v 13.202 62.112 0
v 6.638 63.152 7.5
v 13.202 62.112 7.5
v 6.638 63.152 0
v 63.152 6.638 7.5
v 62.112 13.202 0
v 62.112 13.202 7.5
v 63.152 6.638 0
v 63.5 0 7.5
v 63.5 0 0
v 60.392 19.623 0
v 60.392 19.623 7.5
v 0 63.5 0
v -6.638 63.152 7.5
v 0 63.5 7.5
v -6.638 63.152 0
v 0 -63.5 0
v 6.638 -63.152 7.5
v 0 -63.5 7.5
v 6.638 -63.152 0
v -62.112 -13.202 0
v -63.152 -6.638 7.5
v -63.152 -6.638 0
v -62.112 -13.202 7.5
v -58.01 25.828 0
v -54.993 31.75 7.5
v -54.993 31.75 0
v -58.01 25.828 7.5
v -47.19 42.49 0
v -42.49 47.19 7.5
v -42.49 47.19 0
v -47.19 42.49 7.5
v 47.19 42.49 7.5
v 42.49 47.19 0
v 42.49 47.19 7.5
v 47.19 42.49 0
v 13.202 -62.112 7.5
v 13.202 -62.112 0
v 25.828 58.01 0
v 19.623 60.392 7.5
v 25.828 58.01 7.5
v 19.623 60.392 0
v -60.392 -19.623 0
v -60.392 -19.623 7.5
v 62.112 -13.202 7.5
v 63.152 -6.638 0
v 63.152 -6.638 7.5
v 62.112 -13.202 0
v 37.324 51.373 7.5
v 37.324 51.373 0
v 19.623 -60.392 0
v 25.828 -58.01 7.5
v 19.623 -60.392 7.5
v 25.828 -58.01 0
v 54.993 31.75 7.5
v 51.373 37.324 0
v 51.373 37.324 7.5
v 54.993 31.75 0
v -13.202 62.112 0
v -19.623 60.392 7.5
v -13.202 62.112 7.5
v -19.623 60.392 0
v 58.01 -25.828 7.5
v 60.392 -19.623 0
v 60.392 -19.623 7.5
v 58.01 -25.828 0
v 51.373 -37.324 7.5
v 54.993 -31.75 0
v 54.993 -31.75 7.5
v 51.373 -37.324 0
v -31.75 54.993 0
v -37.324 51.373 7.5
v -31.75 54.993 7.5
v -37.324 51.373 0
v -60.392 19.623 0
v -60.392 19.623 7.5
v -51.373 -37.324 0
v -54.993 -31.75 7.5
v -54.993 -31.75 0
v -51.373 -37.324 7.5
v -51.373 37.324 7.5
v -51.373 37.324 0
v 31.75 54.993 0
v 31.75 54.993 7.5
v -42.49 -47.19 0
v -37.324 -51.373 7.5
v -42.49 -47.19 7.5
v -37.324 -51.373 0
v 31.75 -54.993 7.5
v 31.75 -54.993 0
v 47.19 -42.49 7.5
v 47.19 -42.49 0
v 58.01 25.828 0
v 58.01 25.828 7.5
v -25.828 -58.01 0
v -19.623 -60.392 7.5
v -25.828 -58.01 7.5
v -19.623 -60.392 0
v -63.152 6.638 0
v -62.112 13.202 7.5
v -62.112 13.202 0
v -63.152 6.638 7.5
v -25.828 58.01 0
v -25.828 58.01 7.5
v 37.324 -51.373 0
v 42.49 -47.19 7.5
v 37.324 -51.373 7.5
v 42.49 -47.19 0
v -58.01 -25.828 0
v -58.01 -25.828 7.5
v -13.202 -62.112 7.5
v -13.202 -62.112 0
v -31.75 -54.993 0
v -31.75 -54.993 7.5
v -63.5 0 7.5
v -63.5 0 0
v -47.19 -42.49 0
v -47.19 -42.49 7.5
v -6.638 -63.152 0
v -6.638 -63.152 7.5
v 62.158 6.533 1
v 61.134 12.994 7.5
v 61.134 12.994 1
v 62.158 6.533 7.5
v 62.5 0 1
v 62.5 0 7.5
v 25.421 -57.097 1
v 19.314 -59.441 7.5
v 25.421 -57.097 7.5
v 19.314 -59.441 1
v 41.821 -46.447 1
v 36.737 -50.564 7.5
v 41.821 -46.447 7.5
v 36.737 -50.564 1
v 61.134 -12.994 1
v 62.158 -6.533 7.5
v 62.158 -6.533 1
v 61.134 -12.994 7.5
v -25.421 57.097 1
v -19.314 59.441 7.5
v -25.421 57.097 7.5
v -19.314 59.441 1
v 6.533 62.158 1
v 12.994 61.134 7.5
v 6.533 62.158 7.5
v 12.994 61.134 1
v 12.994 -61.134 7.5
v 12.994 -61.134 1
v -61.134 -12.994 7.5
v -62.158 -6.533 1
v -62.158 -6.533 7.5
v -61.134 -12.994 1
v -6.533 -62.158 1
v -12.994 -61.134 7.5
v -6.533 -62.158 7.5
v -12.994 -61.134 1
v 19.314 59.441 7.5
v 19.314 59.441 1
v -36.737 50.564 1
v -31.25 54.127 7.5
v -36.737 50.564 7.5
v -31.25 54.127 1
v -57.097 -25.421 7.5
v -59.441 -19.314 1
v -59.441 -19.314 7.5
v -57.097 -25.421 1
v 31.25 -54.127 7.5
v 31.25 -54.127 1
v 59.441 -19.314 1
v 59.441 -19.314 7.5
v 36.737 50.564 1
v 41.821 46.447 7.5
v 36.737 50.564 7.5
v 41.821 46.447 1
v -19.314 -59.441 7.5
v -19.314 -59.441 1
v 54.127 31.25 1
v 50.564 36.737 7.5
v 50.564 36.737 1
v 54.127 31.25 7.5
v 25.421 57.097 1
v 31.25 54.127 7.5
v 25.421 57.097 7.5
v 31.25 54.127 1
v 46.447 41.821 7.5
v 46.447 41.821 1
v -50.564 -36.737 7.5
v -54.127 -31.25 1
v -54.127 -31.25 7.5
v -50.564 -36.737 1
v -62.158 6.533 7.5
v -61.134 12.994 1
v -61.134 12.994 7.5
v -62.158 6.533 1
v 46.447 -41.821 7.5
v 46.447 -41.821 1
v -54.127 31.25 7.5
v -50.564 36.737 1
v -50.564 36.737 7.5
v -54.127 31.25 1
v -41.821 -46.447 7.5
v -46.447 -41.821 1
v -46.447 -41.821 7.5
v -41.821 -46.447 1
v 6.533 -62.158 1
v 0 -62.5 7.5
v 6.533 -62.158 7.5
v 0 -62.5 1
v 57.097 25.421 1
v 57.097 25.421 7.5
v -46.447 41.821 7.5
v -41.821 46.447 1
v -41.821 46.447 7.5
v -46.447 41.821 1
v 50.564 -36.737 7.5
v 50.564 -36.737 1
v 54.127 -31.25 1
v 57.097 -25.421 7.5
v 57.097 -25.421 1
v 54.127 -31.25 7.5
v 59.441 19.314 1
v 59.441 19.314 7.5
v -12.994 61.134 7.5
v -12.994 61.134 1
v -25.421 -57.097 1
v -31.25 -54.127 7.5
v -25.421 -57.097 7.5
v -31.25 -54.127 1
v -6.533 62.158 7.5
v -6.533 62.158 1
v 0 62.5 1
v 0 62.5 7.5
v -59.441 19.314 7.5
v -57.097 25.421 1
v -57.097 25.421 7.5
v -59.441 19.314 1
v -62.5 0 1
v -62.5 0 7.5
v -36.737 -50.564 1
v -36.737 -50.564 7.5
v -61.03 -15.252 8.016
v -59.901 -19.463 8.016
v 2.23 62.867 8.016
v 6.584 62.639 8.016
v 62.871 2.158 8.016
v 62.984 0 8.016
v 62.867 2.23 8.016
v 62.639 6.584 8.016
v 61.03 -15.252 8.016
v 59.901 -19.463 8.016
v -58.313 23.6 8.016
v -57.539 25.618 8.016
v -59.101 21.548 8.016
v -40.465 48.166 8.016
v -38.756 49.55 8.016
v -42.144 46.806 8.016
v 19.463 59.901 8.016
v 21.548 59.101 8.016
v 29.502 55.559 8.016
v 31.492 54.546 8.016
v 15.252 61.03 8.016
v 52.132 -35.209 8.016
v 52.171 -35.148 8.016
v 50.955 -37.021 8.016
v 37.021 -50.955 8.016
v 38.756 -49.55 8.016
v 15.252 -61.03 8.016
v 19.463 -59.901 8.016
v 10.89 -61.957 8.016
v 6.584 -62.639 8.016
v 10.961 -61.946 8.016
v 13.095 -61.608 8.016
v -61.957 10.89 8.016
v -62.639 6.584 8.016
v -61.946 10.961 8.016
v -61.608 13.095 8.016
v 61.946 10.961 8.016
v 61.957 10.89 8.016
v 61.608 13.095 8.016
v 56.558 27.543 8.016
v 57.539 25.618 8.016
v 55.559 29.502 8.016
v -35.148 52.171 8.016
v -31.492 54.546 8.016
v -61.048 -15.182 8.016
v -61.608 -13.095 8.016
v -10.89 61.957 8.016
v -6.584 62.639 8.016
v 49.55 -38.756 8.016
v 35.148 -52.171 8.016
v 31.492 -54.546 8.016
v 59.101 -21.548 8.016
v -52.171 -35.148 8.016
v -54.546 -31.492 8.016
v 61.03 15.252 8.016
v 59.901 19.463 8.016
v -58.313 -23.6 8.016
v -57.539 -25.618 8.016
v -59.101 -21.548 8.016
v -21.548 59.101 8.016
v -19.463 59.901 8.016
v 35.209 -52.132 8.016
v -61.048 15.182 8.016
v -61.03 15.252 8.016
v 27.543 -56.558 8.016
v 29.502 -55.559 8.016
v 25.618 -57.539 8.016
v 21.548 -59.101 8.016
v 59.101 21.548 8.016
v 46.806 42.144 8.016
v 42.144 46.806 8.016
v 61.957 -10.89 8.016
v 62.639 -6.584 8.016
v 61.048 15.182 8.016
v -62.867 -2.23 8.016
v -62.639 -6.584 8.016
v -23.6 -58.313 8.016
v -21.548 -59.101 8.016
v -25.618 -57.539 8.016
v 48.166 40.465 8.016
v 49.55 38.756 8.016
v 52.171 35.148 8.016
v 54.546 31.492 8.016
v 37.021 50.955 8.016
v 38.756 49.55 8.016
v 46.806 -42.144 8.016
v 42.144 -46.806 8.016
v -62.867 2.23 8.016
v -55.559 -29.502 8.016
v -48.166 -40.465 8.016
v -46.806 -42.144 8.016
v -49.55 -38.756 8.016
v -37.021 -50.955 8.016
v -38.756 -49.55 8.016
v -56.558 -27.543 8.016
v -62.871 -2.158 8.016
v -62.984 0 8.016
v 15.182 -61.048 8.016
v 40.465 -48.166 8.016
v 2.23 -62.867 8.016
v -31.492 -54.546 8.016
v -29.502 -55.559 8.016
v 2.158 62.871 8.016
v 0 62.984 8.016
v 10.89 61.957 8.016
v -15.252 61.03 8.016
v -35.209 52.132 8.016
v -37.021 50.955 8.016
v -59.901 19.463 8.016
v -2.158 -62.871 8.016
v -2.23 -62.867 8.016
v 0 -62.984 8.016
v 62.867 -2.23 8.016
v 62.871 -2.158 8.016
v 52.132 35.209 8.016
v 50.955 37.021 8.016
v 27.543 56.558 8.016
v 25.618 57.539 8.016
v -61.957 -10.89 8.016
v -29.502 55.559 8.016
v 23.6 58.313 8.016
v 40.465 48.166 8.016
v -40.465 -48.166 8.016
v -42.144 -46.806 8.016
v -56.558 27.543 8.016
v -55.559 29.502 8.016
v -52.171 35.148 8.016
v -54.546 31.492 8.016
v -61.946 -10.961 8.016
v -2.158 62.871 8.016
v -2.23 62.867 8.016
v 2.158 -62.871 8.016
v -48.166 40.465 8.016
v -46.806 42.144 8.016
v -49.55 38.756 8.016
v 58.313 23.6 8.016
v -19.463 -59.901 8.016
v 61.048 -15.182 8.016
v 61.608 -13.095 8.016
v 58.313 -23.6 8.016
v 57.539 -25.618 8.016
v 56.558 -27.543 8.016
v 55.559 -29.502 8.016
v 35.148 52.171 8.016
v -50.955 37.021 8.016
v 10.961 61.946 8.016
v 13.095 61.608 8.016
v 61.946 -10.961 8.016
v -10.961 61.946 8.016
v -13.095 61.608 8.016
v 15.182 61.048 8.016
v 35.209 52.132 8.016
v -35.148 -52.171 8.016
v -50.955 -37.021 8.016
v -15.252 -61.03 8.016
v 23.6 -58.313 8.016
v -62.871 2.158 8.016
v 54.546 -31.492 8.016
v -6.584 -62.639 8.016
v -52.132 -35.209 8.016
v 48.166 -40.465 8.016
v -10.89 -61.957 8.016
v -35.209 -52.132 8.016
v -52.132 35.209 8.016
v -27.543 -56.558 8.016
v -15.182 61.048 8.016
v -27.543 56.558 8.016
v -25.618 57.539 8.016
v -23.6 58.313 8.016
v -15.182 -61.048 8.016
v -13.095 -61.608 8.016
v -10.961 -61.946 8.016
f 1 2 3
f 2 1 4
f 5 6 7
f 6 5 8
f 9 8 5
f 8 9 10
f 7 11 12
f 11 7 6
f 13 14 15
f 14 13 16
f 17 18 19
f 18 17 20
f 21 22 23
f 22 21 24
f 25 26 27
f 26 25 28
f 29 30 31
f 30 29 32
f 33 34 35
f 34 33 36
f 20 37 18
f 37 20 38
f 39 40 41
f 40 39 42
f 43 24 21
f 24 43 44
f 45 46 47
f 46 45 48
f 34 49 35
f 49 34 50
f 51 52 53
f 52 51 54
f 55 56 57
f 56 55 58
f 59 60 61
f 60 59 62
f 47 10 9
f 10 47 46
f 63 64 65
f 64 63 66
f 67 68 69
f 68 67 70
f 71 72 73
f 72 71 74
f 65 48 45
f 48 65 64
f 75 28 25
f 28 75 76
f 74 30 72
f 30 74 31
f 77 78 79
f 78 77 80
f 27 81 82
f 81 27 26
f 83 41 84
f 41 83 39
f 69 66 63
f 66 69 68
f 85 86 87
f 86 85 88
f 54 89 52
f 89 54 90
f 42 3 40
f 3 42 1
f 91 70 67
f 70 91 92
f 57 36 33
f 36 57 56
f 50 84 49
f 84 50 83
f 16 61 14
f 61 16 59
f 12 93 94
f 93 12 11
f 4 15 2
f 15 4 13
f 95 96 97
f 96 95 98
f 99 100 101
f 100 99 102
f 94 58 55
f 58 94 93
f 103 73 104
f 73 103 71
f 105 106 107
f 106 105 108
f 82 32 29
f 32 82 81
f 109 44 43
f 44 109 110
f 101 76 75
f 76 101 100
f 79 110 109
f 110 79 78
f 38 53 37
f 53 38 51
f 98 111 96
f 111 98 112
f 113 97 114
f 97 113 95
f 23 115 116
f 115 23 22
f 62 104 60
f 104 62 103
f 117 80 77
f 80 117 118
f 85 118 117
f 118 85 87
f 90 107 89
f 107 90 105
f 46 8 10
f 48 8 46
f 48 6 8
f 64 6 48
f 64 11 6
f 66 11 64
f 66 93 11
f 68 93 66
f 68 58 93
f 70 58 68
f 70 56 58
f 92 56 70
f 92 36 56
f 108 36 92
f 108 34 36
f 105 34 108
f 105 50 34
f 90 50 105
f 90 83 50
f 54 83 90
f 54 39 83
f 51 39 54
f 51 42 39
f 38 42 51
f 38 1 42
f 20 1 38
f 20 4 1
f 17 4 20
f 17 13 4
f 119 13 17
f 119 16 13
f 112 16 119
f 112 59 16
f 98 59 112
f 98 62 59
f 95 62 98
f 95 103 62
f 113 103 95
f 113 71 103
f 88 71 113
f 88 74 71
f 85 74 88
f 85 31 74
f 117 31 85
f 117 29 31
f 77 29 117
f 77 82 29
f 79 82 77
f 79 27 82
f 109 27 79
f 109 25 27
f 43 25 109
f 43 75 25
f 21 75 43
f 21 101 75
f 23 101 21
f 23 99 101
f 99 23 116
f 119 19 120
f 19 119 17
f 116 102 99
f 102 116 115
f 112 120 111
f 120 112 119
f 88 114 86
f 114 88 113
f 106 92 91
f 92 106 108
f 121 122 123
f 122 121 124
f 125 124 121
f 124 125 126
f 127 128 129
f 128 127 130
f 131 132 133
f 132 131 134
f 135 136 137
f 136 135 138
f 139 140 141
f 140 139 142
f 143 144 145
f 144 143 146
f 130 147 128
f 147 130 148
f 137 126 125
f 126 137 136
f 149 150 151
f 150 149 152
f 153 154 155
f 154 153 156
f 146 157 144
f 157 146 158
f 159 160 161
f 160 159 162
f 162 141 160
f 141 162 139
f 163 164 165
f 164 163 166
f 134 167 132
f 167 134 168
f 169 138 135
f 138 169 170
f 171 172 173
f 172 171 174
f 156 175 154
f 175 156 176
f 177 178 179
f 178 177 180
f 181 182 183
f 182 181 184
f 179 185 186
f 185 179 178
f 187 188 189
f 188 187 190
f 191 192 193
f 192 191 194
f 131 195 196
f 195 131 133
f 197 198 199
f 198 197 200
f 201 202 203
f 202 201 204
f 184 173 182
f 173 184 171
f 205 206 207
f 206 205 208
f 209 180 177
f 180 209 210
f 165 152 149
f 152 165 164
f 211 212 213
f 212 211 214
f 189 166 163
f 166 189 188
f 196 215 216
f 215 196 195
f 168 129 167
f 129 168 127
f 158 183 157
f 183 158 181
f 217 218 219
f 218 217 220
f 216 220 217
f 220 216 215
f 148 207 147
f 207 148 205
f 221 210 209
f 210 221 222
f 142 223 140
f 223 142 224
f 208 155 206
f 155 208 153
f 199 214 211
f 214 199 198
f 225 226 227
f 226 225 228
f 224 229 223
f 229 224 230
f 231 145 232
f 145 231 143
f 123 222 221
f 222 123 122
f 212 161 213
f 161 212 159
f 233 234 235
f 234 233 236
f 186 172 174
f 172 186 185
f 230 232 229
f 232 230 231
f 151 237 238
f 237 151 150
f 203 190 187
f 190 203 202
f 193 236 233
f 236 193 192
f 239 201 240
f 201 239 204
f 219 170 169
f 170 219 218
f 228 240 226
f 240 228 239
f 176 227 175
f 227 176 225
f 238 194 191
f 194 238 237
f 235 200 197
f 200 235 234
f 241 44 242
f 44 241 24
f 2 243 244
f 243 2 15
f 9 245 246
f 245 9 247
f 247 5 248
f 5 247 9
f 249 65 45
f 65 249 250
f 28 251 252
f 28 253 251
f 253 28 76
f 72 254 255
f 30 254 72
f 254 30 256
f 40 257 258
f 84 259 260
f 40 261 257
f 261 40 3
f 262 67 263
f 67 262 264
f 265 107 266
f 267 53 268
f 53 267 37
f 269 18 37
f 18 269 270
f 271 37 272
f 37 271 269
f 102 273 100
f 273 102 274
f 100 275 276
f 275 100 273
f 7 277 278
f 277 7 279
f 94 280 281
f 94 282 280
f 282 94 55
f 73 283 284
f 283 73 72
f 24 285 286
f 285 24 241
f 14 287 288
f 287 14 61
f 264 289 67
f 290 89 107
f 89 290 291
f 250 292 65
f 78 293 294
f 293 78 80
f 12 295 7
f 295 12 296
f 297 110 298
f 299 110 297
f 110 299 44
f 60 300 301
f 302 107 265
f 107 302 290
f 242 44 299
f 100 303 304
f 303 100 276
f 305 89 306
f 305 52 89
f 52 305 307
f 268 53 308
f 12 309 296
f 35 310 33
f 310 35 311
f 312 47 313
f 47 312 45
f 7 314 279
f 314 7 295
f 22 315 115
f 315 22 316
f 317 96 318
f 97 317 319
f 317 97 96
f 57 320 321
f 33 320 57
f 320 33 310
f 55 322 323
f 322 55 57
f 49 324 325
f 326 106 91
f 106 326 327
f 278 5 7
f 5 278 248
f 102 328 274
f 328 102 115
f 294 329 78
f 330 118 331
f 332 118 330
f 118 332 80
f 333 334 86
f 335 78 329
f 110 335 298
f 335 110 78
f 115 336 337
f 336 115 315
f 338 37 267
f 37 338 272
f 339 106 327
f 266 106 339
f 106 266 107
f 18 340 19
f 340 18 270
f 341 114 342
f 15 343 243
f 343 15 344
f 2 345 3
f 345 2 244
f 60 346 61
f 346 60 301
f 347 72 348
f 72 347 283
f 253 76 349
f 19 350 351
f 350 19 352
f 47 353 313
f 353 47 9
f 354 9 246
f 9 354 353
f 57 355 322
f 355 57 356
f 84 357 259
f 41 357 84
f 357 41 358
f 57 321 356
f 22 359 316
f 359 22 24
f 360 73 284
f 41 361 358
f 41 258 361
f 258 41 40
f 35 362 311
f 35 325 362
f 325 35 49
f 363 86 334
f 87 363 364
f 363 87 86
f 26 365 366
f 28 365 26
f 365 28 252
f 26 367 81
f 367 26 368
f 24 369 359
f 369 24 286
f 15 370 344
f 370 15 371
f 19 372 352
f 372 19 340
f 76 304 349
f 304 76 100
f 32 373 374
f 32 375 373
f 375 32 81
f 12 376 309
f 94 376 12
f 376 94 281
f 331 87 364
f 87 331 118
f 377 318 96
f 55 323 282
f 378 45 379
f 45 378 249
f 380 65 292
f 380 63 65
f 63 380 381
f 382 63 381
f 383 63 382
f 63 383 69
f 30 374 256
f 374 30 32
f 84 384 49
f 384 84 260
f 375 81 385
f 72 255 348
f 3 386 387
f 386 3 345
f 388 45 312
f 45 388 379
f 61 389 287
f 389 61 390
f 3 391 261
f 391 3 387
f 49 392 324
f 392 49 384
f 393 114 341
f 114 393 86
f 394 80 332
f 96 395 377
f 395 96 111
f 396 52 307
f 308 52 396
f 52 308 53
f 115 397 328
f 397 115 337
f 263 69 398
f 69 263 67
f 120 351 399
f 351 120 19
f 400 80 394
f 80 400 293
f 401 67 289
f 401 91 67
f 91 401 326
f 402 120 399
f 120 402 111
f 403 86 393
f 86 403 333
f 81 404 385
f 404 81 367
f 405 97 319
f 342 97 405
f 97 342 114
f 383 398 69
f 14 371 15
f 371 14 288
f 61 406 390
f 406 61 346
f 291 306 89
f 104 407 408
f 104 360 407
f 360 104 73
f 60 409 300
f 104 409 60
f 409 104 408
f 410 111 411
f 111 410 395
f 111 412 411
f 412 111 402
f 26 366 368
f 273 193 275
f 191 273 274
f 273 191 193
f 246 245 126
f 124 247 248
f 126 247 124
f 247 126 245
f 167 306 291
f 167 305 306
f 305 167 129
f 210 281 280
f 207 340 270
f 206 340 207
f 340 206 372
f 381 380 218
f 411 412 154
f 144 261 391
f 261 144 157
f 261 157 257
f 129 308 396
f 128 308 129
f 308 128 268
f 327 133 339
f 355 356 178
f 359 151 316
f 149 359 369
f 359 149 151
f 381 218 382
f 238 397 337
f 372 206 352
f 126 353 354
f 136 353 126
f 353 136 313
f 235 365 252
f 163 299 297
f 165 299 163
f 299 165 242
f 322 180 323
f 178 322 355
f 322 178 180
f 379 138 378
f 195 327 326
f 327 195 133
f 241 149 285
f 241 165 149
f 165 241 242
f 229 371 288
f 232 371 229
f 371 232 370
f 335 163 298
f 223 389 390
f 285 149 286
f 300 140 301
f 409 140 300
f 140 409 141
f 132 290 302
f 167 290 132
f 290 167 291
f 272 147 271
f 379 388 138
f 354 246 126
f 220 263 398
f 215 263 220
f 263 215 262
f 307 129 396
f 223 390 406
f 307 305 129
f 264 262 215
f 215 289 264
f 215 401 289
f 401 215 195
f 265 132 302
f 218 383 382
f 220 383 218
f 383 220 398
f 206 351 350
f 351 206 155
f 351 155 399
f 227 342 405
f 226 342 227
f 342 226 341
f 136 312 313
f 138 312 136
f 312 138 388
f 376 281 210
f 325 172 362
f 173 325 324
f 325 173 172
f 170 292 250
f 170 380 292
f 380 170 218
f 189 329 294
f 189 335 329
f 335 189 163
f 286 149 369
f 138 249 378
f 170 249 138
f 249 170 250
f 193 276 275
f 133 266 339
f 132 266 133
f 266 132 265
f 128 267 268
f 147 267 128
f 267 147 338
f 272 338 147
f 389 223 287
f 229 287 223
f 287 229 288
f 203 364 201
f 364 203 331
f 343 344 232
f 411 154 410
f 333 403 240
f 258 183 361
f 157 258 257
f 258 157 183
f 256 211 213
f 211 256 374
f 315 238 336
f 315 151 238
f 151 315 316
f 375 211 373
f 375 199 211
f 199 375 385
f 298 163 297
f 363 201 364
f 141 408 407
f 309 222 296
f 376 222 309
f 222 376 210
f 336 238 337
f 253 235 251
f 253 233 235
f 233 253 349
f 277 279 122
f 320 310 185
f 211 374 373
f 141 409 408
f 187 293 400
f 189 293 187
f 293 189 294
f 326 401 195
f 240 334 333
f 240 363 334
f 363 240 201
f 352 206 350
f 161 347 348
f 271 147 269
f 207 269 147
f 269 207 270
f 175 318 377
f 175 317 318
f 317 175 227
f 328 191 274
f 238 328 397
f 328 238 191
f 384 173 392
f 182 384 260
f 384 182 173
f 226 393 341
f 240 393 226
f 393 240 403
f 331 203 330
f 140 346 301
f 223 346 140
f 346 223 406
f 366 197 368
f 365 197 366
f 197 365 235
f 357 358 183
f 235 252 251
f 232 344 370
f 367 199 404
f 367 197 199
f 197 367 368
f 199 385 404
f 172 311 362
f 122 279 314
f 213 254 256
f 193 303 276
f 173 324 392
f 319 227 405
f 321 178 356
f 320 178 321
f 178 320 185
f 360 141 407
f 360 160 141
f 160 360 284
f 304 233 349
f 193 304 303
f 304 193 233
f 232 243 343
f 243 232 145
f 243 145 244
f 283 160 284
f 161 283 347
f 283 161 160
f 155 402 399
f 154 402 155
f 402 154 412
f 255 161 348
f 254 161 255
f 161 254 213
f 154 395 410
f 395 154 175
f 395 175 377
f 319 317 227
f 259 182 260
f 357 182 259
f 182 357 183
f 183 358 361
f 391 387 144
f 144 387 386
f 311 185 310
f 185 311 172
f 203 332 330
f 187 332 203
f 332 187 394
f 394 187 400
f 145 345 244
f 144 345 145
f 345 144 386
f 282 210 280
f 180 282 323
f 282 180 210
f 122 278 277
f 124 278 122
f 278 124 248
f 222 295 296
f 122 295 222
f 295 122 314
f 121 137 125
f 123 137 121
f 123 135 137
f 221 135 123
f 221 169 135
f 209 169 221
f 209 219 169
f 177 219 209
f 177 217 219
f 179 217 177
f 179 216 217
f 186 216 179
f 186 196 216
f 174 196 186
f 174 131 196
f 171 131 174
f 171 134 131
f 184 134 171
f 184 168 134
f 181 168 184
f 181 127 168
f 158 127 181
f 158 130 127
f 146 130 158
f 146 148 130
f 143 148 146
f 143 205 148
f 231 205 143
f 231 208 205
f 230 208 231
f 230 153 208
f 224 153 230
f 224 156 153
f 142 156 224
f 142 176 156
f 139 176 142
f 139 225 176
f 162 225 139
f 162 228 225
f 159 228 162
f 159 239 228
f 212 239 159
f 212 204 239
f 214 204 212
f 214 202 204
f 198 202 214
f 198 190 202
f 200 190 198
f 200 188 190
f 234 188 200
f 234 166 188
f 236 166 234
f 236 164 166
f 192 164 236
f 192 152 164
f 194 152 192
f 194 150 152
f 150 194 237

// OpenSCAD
// =============================================
// 3D: Circular Plate Cap Ø123.6 (shell 1 mm, height 5 mm)
// Version: 1.0
// Author: ChatGPT (OpenSCAD)
// =============================================

// ----------------------------
// Настройка точности
// ----------------------------
$fn = 0;        // фиксированную сегментацию отключаем
$fa = 6;        // 5–8° обычно достаточно
$fs = 0.35;     // ≈ диаметр сопла (0.3–0.5 для сопла 0.4)
pin_fs = 0.25;  // чуть тоньше для штырей и отверстий

// ----------------------------
// Тестовые фрагменты (стандартный блок)
// ----------------------------
test_fragment = false; // true — печатать только укороченные фрагменты (base)
frag_size     = 20;    // размер квадрата вырезки, мм
frag_index    = 0;     // 0=НЛ, 1=ВЛ, 2=НП, 3=ВП (относительно основания)
frag_gap_x    = 10;    // зазор между фрагментами по X, мм
frag_h_extra  = 20;    // запас по высоте клипа, мм

// ----------------------------
// Фаски/скругления по краям
// ----------------------------
tiny = 0.1;                  // небольшой зазор для булевых операций
edge_chamfer_z = 0.8;        // высота фаски по Z (мм) для верхнего края
edge_chamfer_x = 0;          // совместимость с шаблонами
edge_chamfer_y = 0;          // совместимость с шаблонами
screen_frame_gap = 0.2;      // совместимость

// Скругления
radius_r = 1.5;              // целевой радиус округлений (1–2 мм по ТЗ)

// ----------------------------
// Параметры модели (все размеры в мм)
// ----------------------------
cap_inner_d     = 124.6;   // внутренний диаметр колпака (посадка)
wall_th         = 1.0;     // толщина стенки (радиальная)
top_th          = 1.0;     // толщина крышки сверху
cap_height      = 10.0;     // общая наружная высота колпака
fit_extra_inner = 0.20;    // технологический запас внутрь (увеличение внутреннего Ø)

// Вычисляемые размеры
cap_inner_d_eff = cap_inner_d + 2*fit_extra_inner; // реальный внутренний Ø для печати
cap_outer_d     = cap_inner_d_eff + 2*wall_th;     // наружный Ø
skirt_h         = max(cap_height - top_th, tiny);  // высота юбки (без верхней крышки)

// ----------------------------
// Комментарии по устройству модели
// ----------------------------
// Фрагменты:
// - base: полный колпак — круглая крышка толщиной top_th + цилиндрическая юбка высотой skirt_h
// - Внутренний паз формируется разницей цилиндров (контроль посадки через fit_extra_inner)
// - Наружный диск БЕЗ скругления кромок (по просьбе)

// ----------------------------
// Вспомогательные функции/модули
// ----------------------------
module round_chamfer_ring(d_outer, d_inner, h, chamfer){
    h_ch = min(chamfer, h/2);
    difference(){
        cylinder(h=h - h_ch, d=d_outer);
        translate([0,0,0]) cylinder(h=h - h_ch + tiny, d=d_inner);
    }
    difference(){
        translate([0,0,h - h_ch]) cylinder(h=h_ch, d1=d_outer, d2=max(d_outer - 2*h_ch, tiny));
        translate([0,0,h - h_ch]) cylinder(h=h_ch + tiny, d1=d_inner, d2=max(d_inner + 2*h_ch, tiny));
    }
}

module cap_body(){
    union(){
        // Плоский диск без скругления
        cylinder(h=top_th, d=cap_outer_d);
        // Юбка с мягким переходом сверху
        translate([0,0,0])
            round_chamfer_ring(d_outer=cap_outer_d, d_inner=cap_inner_d_eff, h=skirt_h, chamfer=radius_r);
    }
}

// ----------------------------
// Основная деталь
// ----------------------------
module base(){
    cap_body();
}

// ---------------
// Клиппер фрагментов
// ---------------
module clip_for_fragments(){
    if(test_fragment){
        translate([0,0,0])
            intersection(){
                children();
                translate([-frag_size/2, -frag_size/2, -frag_h_extra])
                    cube([frag_size, frag_size, cap_height + 2*frag_h_extra], center=false);
            }
        translate([cap_outer_d/2 + frag_gap_x + frag_size/2, 0, 0])
            intersection(){
                children();
                translate([-frag_size/2, -frag_size/2, cap_height/2])
                    cube([frag_size, frag_size, cap_height], center=false);
            }
    }else{
        children();
    }
}

// ----------------------------
// ВЫВОД МОДЕЛИ
// ----------------------------
clip_for_fragments() base();
